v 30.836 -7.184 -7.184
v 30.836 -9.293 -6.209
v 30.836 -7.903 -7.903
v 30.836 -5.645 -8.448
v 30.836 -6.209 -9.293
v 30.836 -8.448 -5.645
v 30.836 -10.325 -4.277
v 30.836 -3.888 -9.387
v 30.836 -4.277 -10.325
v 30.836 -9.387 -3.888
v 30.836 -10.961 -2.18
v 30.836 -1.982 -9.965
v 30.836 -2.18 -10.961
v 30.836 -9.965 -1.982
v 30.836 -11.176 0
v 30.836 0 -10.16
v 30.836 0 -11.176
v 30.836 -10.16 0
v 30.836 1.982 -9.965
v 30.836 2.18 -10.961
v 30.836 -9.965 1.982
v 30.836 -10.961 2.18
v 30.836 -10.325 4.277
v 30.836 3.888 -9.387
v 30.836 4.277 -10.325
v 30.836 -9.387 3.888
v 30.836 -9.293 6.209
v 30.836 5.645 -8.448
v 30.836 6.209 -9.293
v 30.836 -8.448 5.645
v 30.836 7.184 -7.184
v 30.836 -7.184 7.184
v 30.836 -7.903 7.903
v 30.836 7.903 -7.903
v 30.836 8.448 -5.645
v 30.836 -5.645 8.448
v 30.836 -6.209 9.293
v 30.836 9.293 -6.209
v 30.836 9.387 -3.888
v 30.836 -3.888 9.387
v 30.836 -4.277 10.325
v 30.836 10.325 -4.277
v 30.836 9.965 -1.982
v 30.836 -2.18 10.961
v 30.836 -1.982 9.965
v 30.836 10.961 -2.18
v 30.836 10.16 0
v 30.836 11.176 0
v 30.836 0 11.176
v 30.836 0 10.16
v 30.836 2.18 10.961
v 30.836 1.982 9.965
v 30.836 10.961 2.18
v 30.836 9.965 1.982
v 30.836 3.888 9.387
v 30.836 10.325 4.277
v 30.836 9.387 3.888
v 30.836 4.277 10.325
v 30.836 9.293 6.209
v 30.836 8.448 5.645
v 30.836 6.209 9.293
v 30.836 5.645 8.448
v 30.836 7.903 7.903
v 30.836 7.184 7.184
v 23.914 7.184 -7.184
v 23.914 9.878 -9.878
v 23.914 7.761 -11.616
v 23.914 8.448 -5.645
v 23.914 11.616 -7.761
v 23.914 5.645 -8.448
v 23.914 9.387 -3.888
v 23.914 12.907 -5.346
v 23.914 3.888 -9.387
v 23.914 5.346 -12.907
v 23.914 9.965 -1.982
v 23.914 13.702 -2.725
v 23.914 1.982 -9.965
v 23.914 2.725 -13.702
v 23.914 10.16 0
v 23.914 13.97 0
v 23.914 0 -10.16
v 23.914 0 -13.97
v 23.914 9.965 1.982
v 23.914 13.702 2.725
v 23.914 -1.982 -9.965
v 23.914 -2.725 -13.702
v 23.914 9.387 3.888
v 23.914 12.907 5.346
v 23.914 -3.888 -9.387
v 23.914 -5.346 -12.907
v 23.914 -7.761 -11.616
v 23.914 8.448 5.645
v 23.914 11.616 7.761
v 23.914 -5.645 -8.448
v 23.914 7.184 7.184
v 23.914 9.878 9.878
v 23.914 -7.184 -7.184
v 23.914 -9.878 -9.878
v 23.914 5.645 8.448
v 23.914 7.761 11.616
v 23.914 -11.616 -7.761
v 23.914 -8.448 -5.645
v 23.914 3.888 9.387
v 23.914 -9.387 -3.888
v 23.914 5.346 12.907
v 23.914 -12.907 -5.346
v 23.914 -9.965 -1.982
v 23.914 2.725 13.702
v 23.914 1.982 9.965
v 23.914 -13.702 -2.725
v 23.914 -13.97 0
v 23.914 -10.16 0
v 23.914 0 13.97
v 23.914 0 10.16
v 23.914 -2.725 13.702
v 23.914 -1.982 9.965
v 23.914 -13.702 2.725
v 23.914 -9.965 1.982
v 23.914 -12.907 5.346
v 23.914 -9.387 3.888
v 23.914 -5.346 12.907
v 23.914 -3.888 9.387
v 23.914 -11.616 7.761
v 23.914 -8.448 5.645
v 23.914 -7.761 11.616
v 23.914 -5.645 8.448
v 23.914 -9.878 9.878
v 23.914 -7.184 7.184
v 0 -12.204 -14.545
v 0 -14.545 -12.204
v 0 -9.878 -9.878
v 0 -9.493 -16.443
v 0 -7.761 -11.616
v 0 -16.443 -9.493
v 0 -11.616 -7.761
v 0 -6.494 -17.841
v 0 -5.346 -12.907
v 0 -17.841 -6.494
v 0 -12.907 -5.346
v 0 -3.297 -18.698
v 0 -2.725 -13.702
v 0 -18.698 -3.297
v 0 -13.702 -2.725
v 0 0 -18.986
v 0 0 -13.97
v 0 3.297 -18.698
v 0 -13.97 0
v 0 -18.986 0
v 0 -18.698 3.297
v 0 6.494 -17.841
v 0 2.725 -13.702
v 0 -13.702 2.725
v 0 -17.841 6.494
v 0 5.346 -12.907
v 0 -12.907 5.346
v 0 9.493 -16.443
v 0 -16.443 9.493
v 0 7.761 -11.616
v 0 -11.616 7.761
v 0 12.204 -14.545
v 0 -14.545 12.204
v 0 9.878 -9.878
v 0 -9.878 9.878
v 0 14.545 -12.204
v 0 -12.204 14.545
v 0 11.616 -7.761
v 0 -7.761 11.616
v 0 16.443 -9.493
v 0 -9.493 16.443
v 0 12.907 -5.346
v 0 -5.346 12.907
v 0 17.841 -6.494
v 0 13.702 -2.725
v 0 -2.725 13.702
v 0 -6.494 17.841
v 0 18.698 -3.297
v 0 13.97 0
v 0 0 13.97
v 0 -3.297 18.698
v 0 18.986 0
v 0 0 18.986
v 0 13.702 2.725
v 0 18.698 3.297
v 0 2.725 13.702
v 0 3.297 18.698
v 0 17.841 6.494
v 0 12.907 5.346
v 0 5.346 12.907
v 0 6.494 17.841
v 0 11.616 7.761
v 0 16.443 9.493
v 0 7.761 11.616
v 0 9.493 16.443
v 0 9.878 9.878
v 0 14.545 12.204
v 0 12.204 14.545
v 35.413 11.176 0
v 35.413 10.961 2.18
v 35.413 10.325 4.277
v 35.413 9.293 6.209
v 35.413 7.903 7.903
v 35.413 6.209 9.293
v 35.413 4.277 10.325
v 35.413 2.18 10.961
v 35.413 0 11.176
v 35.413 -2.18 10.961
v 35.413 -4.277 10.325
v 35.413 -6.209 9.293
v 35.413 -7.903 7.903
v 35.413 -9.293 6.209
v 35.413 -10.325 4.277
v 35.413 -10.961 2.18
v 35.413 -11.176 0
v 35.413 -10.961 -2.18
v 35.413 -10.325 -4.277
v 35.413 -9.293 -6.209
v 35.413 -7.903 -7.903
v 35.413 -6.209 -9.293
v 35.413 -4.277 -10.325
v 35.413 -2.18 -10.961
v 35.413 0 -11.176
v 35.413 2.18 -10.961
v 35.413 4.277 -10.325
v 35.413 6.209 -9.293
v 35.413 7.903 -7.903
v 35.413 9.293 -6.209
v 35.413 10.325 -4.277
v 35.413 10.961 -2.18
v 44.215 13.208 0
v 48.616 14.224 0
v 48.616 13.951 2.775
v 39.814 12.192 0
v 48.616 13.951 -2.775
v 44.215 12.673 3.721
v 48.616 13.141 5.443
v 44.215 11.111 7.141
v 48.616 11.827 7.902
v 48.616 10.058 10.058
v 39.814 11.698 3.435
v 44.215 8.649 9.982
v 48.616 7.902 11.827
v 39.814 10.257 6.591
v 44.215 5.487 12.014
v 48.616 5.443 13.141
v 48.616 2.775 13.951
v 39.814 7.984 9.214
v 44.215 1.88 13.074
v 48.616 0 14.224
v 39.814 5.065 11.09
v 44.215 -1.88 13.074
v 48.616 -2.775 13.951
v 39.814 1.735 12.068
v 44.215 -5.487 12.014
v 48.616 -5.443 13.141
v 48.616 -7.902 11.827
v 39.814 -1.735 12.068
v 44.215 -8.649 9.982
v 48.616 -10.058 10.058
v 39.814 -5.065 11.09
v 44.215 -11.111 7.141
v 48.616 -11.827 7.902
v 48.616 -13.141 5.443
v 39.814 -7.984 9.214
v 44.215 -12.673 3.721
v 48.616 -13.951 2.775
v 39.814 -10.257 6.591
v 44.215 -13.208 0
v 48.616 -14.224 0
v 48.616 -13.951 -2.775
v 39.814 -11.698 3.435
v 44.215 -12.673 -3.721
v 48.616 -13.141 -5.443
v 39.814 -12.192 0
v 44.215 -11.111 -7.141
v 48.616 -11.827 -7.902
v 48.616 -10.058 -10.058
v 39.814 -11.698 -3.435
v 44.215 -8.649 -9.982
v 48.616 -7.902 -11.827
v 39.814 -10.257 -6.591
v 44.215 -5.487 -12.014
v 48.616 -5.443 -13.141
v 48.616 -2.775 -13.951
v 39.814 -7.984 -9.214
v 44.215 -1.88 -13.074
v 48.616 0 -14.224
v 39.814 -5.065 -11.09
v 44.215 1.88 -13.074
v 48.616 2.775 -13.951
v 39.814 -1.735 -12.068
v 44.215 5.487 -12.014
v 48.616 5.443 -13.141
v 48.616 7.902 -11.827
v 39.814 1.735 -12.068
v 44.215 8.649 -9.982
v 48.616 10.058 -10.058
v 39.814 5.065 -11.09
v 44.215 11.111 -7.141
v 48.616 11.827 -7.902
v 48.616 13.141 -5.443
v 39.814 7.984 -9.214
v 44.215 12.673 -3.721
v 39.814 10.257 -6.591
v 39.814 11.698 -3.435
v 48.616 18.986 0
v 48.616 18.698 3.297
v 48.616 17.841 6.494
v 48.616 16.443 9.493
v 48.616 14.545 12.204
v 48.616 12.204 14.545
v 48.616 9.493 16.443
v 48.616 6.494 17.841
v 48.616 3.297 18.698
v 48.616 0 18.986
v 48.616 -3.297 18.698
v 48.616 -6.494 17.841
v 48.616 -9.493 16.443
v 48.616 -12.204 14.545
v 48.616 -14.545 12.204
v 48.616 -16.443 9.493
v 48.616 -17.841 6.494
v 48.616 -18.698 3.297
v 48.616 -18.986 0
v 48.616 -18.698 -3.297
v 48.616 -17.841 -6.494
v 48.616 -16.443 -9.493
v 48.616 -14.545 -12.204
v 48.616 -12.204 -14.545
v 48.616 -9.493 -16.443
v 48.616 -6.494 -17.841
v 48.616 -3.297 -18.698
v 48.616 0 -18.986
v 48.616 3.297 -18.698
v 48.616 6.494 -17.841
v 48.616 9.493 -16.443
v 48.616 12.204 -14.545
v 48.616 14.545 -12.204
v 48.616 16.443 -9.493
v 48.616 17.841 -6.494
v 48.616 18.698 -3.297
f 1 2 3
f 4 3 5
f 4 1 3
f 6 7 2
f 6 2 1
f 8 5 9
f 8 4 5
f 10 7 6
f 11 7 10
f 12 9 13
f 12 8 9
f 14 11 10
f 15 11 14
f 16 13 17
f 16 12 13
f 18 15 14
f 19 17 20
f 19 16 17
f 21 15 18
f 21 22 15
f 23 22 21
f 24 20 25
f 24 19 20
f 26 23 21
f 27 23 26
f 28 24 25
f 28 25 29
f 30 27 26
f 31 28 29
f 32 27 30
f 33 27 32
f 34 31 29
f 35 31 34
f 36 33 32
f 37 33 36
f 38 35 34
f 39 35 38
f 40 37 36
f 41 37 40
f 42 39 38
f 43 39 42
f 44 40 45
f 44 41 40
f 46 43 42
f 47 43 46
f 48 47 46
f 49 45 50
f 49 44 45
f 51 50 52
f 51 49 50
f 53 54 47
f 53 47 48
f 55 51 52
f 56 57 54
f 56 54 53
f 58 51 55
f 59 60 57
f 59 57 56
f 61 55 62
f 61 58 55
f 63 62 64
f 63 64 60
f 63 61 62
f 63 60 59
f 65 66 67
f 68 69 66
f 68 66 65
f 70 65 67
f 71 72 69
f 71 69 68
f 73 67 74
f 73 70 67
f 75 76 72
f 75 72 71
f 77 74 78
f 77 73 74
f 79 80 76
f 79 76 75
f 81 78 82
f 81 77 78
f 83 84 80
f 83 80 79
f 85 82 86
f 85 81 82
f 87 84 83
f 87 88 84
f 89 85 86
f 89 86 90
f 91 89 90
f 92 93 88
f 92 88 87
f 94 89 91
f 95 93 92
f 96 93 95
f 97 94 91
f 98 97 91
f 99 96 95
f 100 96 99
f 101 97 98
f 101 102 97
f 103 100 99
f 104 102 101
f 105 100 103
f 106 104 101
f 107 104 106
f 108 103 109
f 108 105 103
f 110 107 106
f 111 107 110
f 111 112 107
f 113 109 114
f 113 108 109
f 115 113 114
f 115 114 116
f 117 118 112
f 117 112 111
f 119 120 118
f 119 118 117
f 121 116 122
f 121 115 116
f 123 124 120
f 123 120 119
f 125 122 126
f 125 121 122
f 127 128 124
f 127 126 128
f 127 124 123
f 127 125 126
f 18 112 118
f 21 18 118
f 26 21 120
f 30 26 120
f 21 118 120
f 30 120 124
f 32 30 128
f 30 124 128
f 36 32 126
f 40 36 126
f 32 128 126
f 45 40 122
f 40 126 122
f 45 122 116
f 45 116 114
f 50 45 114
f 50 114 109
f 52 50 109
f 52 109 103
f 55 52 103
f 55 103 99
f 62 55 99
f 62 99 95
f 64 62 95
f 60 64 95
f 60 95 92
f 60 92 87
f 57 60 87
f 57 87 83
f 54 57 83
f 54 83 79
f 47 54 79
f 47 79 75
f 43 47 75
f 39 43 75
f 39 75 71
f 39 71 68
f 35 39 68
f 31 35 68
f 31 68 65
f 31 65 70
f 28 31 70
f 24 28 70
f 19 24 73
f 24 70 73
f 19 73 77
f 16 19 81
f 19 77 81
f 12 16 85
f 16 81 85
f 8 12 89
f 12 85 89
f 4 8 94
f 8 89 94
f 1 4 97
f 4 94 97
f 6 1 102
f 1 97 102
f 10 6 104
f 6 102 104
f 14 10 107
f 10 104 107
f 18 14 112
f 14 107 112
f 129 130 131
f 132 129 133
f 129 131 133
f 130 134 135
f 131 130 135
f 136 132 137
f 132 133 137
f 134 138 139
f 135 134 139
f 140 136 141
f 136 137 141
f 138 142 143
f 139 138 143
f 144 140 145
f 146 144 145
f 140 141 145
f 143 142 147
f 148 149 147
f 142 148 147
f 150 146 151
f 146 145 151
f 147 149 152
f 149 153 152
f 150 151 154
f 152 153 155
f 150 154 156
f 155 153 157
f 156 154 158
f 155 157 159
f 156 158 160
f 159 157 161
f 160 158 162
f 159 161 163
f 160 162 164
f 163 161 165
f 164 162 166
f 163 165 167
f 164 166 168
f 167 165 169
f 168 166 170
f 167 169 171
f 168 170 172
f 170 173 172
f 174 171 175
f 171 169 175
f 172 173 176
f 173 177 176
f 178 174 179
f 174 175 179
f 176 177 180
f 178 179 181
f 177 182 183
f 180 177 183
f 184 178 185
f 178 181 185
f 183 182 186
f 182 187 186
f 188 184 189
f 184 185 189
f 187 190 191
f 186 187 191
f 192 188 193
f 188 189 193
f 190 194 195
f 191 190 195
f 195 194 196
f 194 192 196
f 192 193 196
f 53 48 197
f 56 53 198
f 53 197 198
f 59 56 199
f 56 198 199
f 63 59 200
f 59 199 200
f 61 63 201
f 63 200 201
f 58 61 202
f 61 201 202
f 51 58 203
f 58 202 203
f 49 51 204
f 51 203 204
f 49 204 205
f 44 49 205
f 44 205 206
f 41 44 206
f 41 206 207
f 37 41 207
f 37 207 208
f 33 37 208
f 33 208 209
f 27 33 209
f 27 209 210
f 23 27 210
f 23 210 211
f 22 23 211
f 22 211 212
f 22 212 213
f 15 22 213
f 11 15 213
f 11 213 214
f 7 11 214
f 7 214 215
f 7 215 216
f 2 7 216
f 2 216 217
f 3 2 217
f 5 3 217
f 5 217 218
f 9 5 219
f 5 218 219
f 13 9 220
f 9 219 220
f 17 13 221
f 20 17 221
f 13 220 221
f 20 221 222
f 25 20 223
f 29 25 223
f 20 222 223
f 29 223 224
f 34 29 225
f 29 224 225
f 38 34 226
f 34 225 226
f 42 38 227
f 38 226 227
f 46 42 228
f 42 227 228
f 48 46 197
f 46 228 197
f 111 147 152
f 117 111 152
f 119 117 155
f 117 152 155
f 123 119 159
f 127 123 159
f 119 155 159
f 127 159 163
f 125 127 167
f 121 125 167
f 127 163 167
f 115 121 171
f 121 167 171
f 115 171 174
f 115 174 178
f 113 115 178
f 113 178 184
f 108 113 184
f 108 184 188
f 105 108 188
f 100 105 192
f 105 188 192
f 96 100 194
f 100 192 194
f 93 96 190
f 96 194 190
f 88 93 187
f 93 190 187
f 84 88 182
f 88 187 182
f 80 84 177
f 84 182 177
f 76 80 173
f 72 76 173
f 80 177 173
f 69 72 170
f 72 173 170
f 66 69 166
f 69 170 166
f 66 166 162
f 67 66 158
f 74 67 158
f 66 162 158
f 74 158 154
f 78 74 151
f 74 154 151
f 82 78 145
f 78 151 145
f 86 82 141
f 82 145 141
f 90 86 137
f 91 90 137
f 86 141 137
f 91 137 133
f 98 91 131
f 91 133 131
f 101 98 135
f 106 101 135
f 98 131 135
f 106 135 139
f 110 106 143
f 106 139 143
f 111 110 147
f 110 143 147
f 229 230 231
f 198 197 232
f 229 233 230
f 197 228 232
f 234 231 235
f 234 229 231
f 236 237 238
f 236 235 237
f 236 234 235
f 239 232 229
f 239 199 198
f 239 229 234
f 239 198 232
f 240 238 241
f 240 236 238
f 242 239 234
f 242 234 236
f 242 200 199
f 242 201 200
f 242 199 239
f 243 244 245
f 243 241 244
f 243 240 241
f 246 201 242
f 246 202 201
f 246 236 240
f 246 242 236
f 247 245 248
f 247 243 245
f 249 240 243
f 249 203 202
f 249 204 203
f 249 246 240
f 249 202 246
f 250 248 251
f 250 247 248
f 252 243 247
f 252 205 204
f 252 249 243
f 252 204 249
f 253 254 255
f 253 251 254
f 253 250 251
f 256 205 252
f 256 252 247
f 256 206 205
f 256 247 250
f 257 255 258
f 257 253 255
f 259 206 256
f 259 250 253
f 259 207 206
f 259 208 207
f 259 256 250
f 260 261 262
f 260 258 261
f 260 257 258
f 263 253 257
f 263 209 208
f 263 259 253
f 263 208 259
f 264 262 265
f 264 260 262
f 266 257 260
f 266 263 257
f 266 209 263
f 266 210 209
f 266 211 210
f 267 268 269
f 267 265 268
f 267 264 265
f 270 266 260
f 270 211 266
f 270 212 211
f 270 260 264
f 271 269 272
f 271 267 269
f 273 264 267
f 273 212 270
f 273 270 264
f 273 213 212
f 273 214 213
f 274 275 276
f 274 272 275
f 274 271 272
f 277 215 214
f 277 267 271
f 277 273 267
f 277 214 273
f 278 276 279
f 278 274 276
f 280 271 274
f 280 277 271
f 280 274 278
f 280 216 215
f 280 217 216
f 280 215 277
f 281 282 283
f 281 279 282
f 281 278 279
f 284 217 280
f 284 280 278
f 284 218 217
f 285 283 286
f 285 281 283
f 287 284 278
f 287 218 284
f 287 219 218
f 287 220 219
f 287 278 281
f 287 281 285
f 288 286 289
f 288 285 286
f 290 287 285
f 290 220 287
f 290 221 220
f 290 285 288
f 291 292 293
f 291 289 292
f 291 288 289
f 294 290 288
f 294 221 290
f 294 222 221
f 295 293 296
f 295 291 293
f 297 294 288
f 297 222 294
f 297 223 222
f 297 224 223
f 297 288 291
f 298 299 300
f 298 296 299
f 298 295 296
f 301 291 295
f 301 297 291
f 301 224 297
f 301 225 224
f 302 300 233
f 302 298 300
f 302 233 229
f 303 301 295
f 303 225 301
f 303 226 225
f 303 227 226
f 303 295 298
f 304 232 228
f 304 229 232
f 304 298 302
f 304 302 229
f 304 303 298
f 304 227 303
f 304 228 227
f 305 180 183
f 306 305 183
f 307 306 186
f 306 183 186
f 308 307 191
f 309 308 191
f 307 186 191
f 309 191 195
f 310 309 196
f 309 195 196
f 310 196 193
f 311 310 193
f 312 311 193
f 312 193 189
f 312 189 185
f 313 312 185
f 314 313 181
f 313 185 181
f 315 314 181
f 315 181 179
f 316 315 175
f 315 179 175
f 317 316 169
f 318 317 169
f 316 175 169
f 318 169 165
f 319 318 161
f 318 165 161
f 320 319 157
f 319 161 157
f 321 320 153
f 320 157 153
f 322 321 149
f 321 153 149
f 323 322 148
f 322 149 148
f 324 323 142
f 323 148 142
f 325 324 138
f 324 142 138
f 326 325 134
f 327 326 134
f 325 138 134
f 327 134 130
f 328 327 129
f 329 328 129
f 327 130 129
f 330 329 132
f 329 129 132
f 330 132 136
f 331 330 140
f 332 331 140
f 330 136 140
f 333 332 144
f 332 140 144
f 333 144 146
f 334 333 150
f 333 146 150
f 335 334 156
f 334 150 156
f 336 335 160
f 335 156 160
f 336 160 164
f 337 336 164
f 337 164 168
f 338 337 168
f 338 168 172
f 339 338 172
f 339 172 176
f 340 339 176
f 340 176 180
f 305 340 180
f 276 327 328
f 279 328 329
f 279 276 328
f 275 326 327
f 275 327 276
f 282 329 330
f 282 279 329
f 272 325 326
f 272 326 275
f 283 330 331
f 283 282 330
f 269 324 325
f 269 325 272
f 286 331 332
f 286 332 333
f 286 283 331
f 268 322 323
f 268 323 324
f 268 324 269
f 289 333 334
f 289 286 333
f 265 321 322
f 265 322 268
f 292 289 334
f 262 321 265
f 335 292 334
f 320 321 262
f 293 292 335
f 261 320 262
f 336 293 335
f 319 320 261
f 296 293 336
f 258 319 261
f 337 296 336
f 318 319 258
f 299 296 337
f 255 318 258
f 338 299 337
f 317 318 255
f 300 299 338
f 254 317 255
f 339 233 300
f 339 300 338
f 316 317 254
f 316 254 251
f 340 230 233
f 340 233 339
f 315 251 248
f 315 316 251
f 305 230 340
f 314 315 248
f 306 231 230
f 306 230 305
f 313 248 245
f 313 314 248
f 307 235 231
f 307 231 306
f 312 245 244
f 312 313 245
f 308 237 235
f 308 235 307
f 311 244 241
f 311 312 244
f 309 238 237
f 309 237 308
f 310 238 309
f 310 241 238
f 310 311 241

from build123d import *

# Parameters (mm, degrees)
F0_R     = 18.9865
F1_DEPTH = 48.6156
F2_R     = 13.97
F3_DEPTH = 23.9141
F4_R     = 10.16
F5_DEPTH = 24.7025
F6_R     = 11.176
F7_DEPTH = 17.78
F8_R     = 14.224
F9_DEPTH = 17.78
F9_TAPER = 13


with BuildPart() as f1:
    # F0 (on Right) → F1 (new body)
    with BuildSketch(Plane.YZ):
        Circle(F0_R)
    extrude(amount=F1_DEPTH)

    # F2 (on face) → F3 (cut)
    with BuildSketch(Plane(origin=(0, 0, 0), x_dir=(0, -1, 0), z_dir=(-1, 0, 0))):
        Circle(F2_R)
    extrude(amount=-F3_DEPTH, mode=Mode.SUBTRACT)

    # F4 (on face) → F5 (cut, through all)
    with BuildSketch(Plane(origin=(23.9141, 0, 0), x_dir=(0, -1, 0), z_dir=(-1, 0, 0))):
        Circle(F4_R)
    extrude(amount=-F5_DEPTH, mode=Mode.SUBTRACT)

    # F6 (on face) → F7 (cut)
    with BuildSketch(Plane.YZ.offset(48.6156)):
        Circle(F6_R)
    extrude(amount=-F7_DEPTH, mode=Mode.SUBTRACT)

    # F8 (on face) → F9 (cut)
    with BuildSketch(Plane.YZ.offset(48.6156)):
        Circle(F8_R)
    extrude(amount=-F9_DEPTH, taper=F9_TAPER, mode=Mode.SUBTRACT)


solid = f1.part
